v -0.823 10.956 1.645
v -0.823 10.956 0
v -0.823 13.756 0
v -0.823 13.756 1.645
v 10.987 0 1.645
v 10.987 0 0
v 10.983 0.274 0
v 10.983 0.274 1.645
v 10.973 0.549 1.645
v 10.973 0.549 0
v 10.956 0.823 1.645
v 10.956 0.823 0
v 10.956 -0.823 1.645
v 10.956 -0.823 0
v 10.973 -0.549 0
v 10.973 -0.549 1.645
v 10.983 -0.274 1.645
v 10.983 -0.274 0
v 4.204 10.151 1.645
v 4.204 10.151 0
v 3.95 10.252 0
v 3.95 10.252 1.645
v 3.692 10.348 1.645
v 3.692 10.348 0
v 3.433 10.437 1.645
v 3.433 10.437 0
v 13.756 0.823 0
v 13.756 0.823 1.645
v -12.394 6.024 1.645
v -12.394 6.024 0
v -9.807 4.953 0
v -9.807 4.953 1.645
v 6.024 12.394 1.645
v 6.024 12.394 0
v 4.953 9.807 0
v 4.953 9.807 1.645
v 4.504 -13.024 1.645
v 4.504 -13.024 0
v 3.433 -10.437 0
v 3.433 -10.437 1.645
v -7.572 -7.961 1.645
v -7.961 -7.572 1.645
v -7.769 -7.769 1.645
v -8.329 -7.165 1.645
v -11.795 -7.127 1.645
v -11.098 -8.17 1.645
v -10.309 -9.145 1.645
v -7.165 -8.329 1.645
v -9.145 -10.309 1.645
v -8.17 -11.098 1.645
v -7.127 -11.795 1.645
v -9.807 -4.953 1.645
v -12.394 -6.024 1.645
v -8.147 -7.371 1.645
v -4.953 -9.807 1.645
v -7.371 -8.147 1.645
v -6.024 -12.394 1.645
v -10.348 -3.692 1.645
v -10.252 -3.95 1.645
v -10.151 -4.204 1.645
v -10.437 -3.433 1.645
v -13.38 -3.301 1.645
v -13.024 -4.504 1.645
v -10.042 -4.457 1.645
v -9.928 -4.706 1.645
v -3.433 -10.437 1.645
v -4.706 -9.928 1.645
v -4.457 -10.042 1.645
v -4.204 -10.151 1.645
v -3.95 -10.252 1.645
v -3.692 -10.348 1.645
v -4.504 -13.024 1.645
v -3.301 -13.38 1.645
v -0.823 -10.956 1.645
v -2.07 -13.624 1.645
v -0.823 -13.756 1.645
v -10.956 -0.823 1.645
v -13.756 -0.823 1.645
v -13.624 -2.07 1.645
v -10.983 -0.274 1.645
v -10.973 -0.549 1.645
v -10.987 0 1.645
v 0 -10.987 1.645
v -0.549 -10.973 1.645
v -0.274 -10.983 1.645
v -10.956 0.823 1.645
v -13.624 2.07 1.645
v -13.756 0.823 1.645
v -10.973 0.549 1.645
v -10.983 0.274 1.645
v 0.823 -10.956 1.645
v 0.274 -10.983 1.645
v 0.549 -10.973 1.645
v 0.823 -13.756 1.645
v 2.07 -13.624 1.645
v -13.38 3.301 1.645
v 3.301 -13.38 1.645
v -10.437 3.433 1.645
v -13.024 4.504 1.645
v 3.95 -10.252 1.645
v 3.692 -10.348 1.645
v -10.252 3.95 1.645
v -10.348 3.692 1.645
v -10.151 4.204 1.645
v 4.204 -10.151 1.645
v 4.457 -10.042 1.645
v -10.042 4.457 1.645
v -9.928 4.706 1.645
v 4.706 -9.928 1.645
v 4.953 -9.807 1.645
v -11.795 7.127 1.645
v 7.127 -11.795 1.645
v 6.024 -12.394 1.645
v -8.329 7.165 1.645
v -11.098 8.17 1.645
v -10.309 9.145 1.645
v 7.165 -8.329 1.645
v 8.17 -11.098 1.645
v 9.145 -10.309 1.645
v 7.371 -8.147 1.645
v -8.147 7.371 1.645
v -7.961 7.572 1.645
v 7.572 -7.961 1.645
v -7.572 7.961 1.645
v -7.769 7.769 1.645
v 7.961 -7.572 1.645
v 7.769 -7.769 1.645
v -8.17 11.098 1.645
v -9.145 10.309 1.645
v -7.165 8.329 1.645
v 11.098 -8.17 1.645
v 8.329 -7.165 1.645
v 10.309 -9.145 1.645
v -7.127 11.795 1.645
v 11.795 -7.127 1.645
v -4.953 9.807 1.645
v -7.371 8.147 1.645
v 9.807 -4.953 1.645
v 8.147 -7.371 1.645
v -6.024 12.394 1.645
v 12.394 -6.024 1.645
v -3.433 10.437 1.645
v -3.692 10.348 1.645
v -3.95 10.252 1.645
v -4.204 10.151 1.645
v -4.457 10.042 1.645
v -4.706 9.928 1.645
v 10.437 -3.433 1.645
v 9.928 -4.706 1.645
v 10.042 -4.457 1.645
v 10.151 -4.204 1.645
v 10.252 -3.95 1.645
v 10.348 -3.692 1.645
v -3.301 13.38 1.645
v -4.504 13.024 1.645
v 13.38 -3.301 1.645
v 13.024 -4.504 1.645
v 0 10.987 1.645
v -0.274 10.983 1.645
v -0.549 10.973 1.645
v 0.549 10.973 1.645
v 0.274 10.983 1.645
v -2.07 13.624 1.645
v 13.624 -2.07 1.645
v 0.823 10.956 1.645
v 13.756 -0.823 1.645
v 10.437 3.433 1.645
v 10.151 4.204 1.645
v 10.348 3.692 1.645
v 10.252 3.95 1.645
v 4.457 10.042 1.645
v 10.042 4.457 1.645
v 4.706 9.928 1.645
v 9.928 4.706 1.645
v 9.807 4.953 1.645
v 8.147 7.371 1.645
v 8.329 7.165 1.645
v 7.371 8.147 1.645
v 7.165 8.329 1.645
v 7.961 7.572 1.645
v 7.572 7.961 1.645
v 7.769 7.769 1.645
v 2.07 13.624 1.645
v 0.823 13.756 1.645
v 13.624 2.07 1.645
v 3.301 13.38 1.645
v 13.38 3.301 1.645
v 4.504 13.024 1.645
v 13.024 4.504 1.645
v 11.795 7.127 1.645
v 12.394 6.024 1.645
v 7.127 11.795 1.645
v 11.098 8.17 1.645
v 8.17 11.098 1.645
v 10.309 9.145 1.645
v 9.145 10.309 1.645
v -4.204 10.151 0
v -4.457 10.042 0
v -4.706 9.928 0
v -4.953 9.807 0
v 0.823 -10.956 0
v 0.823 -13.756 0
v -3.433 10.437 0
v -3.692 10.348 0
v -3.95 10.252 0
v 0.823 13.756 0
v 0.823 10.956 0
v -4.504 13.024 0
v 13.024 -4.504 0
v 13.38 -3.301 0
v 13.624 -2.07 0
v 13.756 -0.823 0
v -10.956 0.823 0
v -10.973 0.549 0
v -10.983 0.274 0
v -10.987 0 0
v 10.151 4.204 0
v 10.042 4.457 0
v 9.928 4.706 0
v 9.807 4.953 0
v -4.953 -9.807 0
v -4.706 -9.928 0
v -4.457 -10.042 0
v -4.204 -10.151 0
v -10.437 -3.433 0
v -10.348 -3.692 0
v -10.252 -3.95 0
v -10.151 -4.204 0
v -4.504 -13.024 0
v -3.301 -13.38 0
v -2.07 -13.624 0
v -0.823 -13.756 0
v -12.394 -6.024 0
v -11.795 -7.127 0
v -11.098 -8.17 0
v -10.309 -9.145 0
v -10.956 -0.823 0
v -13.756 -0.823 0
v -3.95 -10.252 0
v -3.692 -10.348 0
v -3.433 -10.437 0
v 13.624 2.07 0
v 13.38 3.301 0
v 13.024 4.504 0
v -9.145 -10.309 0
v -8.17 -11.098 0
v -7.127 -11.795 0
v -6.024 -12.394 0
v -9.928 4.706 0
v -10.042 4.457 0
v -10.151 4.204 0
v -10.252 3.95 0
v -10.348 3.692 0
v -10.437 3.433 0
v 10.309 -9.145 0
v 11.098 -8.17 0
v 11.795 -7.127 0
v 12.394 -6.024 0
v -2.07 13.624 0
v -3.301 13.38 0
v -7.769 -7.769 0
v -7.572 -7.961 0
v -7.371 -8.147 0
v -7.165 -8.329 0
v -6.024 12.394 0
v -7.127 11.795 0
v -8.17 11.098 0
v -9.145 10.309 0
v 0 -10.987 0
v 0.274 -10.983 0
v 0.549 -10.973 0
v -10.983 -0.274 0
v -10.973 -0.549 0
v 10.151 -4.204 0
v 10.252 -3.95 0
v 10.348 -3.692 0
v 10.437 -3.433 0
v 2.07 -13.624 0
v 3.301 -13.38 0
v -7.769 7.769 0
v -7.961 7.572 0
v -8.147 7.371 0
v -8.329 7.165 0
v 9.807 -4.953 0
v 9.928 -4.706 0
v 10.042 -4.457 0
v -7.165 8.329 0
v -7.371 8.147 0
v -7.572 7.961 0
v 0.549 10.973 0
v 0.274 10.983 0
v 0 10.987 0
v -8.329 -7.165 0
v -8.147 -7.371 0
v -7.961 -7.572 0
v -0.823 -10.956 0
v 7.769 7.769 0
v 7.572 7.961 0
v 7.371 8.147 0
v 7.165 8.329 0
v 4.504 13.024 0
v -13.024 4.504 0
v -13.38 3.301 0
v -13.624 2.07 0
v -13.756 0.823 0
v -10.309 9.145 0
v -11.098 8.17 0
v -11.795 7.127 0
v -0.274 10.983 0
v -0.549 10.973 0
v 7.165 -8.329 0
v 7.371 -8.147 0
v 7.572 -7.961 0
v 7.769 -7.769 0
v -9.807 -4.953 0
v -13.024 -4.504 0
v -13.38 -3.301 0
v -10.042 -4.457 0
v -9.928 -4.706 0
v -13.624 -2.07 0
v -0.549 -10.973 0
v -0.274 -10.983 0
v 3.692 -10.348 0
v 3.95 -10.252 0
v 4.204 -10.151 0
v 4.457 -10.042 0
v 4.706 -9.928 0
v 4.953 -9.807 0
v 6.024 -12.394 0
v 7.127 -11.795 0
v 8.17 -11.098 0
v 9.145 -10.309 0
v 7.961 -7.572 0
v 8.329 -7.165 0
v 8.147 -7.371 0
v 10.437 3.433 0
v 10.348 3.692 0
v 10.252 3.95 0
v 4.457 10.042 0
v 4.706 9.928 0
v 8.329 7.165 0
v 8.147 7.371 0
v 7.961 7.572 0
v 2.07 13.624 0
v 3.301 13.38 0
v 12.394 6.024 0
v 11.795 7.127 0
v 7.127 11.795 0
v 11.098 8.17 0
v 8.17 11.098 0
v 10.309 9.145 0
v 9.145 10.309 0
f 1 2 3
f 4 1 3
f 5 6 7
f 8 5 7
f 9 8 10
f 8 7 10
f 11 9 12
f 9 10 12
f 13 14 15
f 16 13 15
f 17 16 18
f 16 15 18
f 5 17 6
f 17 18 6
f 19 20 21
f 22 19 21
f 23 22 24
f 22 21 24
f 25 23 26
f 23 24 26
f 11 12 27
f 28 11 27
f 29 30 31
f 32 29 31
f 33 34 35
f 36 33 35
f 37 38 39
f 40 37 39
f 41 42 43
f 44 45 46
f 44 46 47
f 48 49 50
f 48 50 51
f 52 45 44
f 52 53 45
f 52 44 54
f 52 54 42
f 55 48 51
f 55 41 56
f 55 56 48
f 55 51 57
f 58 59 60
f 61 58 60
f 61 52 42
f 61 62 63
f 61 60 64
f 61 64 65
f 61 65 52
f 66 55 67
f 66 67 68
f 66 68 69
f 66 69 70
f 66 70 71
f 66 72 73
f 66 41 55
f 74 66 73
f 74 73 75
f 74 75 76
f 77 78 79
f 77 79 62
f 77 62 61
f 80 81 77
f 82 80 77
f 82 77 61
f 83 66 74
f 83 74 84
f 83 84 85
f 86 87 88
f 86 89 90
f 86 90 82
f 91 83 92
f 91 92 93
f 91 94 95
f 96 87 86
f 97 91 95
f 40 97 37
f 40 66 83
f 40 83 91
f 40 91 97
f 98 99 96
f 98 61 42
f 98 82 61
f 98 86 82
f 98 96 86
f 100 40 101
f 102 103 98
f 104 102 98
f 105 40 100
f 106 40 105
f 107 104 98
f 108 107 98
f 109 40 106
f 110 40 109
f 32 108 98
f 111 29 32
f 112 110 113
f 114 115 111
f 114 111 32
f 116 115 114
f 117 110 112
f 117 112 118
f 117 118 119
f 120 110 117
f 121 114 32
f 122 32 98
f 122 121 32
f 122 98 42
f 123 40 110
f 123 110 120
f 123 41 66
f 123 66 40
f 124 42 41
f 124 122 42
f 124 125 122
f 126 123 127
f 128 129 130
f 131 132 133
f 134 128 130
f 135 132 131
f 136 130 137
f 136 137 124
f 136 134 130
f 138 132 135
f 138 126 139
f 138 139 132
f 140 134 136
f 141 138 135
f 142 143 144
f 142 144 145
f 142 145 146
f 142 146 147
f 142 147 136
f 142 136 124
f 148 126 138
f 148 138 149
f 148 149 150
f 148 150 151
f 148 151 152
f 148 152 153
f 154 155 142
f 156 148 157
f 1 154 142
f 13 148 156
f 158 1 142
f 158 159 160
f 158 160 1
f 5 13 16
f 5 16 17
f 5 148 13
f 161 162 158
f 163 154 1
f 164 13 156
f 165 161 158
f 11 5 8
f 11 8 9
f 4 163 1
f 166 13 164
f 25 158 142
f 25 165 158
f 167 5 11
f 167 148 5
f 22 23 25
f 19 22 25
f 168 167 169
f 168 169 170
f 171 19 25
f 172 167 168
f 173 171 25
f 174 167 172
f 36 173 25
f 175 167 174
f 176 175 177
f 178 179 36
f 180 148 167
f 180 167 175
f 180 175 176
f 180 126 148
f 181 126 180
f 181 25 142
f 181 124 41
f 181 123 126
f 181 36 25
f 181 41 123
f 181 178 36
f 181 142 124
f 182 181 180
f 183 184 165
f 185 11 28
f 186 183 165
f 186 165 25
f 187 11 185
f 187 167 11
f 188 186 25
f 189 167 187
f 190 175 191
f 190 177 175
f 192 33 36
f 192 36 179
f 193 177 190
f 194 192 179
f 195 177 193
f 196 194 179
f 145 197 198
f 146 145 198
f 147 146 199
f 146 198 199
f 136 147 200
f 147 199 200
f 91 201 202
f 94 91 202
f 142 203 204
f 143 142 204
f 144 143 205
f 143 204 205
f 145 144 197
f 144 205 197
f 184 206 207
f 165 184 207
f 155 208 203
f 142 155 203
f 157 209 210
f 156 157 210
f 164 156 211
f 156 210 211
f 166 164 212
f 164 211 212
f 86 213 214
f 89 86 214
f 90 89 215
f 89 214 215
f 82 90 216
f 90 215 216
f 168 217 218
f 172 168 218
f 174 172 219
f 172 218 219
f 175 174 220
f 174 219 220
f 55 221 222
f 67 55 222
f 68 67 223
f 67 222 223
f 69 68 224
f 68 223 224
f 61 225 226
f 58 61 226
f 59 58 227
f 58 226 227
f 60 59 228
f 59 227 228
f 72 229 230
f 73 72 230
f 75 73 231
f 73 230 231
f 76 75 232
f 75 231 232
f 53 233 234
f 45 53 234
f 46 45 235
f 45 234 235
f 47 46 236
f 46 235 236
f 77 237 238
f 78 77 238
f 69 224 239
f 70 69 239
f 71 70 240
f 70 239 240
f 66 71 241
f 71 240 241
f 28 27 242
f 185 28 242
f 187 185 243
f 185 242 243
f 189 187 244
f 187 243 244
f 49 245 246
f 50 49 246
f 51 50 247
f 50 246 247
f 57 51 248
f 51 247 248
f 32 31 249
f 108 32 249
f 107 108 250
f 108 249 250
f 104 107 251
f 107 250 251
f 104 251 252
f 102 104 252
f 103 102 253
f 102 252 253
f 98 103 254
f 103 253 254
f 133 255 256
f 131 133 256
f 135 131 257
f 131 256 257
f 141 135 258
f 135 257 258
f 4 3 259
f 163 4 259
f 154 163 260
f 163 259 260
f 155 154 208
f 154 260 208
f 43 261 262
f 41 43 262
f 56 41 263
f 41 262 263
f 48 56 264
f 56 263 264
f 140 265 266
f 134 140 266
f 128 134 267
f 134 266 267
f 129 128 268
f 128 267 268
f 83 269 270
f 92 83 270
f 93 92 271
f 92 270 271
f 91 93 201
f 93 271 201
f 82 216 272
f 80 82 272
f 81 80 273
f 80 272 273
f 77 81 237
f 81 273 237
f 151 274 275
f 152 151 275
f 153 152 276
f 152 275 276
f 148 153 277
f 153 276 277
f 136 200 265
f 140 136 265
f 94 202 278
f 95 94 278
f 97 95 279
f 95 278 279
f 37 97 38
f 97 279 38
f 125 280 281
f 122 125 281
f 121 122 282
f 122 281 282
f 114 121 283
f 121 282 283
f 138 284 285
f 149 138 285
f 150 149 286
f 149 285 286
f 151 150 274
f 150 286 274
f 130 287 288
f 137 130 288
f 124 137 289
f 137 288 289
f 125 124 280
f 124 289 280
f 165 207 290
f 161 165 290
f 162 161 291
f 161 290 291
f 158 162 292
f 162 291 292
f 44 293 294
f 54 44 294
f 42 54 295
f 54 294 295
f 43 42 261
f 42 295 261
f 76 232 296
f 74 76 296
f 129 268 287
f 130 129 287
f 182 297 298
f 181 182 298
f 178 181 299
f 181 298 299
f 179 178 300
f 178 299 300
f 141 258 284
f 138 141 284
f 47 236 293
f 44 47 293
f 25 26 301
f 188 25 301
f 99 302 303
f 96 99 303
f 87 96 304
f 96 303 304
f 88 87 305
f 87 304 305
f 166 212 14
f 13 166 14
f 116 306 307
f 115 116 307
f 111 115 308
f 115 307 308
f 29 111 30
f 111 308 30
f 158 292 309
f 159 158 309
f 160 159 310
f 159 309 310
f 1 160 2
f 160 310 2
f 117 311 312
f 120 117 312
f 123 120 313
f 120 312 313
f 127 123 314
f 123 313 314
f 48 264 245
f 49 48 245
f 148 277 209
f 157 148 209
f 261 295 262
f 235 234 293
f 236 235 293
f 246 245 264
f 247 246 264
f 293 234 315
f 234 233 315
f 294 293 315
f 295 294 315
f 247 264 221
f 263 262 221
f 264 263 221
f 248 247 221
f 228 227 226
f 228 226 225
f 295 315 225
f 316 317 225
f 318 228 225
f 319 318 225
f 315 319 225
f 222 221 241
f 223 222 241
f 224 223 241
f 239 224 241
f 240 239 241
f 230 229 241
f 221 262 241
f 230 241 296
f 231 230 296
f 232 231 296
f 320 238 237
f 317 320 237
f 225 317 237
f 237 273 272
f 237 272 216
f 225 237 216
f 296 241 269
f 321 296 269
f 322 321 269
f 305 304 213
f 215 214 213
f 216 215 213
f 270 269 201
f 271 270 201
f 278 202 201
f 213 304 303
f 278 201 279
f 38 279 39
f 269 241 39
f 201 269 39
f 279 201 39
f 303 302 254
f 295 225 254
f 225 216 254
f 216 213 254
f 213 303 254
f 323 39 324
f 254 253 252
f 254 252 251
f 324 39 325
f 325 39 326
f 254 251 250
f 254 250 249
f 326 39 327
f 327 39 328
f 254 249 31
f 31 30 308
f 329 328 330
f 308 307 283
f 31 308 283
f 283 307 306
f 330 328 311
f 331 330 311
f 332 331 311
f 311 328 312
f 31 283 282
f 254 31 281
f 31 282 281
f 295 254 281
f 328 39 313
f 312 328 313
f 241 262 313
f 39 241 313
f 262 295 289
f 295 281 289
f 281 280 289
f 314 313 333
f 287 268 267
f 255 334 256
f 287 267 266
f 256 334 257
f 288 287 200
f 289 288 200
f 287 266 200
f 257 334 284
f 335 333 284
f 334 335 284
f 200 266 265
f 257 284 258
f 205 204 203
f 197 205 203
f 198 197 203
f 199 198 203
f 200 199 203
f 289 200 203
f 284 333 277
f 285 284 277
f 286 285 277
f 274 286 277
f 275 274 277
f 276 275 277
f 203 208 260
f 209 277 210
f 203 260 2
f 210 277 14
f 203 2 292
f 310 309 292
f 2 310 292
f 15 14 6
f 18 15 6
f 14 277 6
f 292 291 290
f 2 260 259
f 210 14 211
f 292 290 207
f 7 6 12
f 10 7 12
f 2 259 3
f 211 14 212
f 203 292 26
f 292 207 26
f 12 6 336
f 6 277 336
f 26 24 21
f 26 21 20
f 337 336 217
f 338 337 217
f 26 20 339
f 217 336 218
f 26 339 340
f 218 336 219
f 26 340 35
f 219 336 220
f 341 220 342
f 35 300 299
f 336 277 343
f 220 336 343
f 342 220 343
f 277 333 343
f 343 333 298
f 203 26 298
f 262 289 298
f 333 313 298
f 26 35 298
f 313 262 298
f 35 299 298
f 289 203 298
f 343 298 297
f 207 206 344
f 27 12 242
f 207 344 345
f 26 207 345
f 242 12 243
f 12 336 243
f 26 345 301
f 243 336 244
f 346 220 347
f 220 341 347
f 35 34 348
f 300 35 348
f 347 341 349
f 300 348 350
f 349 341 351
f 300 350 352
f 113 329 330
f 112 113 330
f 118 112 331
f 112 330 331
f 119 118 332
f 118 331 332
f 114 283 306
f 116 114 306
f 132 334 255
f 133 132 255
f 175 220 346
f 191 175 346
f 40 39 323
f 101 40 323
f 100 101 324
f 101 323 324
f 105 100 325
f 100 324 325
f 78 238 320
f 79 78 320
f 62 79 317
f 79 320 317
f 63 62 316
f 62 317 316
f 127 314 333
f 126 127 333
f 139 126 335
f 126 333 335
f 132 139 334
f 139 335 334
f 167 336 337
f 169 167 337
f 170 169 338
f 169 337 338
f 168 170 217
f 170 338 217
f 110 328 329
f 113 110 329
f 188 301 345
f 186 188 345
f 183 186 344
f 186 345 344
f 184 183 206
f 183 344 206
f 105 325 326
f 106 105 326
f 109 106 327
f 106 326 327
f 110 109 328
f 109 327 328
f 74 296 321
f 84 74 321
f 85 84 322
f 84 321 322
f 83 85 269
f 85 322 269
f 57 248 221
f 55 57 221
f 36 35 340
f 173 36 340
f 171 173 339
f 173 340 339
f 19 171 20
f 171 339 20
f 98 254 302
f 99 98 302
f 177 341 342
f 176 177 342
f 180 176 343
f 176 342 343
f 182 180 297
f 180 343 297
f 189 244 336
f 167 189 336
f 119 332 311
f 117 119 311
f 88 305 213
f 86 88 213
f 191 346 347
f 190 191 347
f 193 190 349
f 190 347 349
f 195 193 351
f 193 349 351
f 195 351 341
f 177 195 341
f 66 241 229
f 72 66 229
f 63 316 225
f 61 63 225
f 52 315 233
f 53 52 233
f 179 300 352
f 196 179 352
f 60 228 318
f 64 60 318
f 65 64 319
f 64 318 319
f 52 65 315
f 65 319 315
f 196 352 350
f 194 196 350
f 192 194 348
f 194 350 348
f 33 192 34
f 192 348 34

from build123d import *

# Parameters (mm, degrees)
BOSS_EXTRUDE1_DEPTH = 1.6446


with BuildPart() as part:
    # Sketch1 → Boss-Extrude1 (new body)
    with BuildSketch(Plane.XY):
        with BuildLine():
            ThreePointArc((-3.43261036, 10.436873188), (-4.204490048, 10.150536896), (-4.952761743, 9.807205869))
            Line((-4.952761743, 9.807205869), (-6.024377274, 12.394314617))
            ThreePointArc((-6.024377274, 12.394314617), (-7.65623669, 11.458367951), (-9.145424221, 10.308897719))
            Line((-9.145424221, 10.308897719), (-7.16533691, 8.328810408))
            ThreePointArc((-7.16533691, 8.328810408), (-7.768884599, 7.768884599), (-8.328810408, 7.16533691))
            Line((-8.328810408, 7.16533691), (-10.308897719, 9.145424221))
            ThreePointArc((-10.308897719, 9.145424221), (-11.458367951, 7.65623669), (-12.394314617, 6.024377274))
            Line((-12.394314617, 6.024377274), (-9.807205869, 4.952761743))
            ThreePointArc((-9.807205869, 4.952761743), (-10.150536896, 4.204490048), (-10.436873188, 3.43261036))
            Line((-10.436873188, 3.43261036), (-13.023981937, 4.504225891))
            ThreePointArc((-13.023981937, 4.504225891), (-13.516066562, 2.688512797), (-13.756282967, 0.8227))
            Line((-13.756282967, 0.8227), (-10.956016637, 0.8227))
            ThreePointArc((-10.956016637, 0.8227), (-10.986861965, 0), (-10.956016637, -0.8227))
            Line((-10.956016637, -0.8227), (-13.756282967, -0.8227))
            ThreePointArc((-13.756282967, -0.8227), (-13.516066562, -2.688512797), (-13.023981937, -4.504225891))
            Line((-13.023981937, -4.504225891), (-10.436873188, -3.43261036))
            ThreePointArc((-10.436873188, -3.43261036), (-10.150536896, -4.204490048), (-9.807205869, -4.952761743))
            Line((-9.807205869, -4.952761743), (-12.394314617, -6.024377274))
            ThreePointArc((-12.394314617, -6.024377274), (-11.458367951, -7.65623669), (-10.308897719, -9.145424221))
            Line((-10.308897719, -9.145424221), (-8.328810408, -7.16533691))
            ThreePointArc((-8.328810408, -7.16533691), (-7.768884599, -7.768884599), (-7.16533691, -8.328810408))
            Line((-7.16533691, -8.328810408), (-9.145424221, -10.308897719))
            ThreePointArc((-9.145424221, -10.308897719), (-7.65623669, -11.458367951), (-6.024377274, -12.394314617))
            Line((-6.024377274, -12.394314617), (-4.952761743, -9.807205869))
            ThreePointArc((-4.952761743, -9.807205869), (-4.204490048, -10.150536896), (-3.43261036, -10.436873188))
            Line((-3.43261036, -10.436873188), (-4.504225891, -13.023981937))
            ThreePointArc((-4.504225891, -13.023981937), (-2.688512797, -13.516066562), (-0.8227, -13.756282967))
            Line((-0.8227, -13.756282967), (-0.8227, -10.956016637))
            ThreePointArc((-0.8227, -10.956016637), (0, -10.986861965), (0.8227, -10.956016637))
            Line((0.8227, -10.956016637), (0.8227, -13.756282967))
            ThreePointArc((0.8227, -13.756282967), (2.688512797, -13.516066562), (4.504225891, -13.023981937))
            Line((4.504225891, -13.023981937), (3.43261036, -10.436873188))
            ThreePointArc((3.43261036, -10.436873188), (4.204490048, -10.150536896), (4.952761743, -9.807205869))
            Line((4.952761743, -9.807205869), (6.024377274, -12.394314617))
            ThreePointArc((6.024377274, -12.394314617), (7.65623669, -11.458367951), (9.145424221, -10.308897719))
            Line((9.145424221, -10.308897719), (7.16533691, -8.328810408))
            ThreePointArc((7.16533691, -8.328810408), (7.768884599, -7.768884599), (8.328810408, -7.16533691))
            Line((8.328810408, -7.16533691), (10.308897719, -9.145424221))
            ThreePointArc((10.308897719, -9.145424221), (11.458367951, -7.65623669), (12.394314617, -6.024377274))
            Line((12.394314617, -6.024377274), (9.807205869, -4.952761743))
            ThreePointArc((9.807205869, -4.952761743), (10.150536896, -4.204490048), (10.436873188, -3.43261036))
            Line((10.436873188, -3.43261036), (13.023981937, -4.504225891))
            ThreePointArc((13.023981937, -4.504225891), (13.516066562, -2.688512797), (13.756282967, -0.8227))
            Line((13.756282967, -0.8227), (10.956016637, -0.8227))
            ThreePointArc((10.956016637, -0.8227), (10.986861965, 0), (10.956016637, 0.8227))
            Line((10.956016637, 0.8227), (13.756282967, 0.8227))
            ThreePointArc((13.756282967, 0.8227), (13.516066562, 2.688512797), (13.023981937, 4.504225891))
            Line((13.023981937, 4.504225891), (10.436873188, 3.43261036))
            ThreePointArc((10.436873188, 3.43261036), (10.150536896, 4.204490048), (9.807205869, 4.952761743))
            Line((9.807205869, 4.952761743), (12.394314617, 6.024377274))
            ThreePointArc((12.394314617, 6.024377274), (11.458367951, 7.65623669), (10.308897719, 9.145424221))
            Line((10.308897719, 9.145424221), (8.328810408, 7.16533691))
            ThreePointArc((8.328810408, 7.16533691), (7.768884599, 7.768884599), (7.16533691, 8.328810408))
            Line((7.16533691, 8.328810408), (9.145424221, 10.308897719))
            ThreePointArc((9.145424221, 10.308897719), (7.65623669, 11.458367951), (6.024377274, 12.394314617))
            Line((6.024377274, 12.394314617), (4.952761743, 9.807205869))
            ThreePointArc((4.952761743, 9.807205869), (4.204490048, 10.150536896), (3.43261036, 10.436873188))
            Line((3.43261036, 10.436873188), (4.504225891, 13.023981937))
            ThreePointArc((4.504225891, 13.023981937), (2.688512797, 13.516066562), (0.8227, 13.756282967))
            Line((0.8227, 13.756282967), (0.8227, 10.956016637))
            ThreePointArc((0.8227, 10.956016637), (0, 10.986861965), (-0.8227, 10.956016637))
            Line((-0.8227, 10.956016637), (-0.8227, 13.756282967))
            ThreePointArc((-0.8227, 13.756282967), (-2.688512797, 13.516066562), (-4.504225891, 13.023981937))
            Line((-4.504225891, 13.023981937), (-3.43261036, 10.436873188))
        make_face()
    extrude(amount=BOSS_EXTRUDE1_DEPTH)


solid = part.part
